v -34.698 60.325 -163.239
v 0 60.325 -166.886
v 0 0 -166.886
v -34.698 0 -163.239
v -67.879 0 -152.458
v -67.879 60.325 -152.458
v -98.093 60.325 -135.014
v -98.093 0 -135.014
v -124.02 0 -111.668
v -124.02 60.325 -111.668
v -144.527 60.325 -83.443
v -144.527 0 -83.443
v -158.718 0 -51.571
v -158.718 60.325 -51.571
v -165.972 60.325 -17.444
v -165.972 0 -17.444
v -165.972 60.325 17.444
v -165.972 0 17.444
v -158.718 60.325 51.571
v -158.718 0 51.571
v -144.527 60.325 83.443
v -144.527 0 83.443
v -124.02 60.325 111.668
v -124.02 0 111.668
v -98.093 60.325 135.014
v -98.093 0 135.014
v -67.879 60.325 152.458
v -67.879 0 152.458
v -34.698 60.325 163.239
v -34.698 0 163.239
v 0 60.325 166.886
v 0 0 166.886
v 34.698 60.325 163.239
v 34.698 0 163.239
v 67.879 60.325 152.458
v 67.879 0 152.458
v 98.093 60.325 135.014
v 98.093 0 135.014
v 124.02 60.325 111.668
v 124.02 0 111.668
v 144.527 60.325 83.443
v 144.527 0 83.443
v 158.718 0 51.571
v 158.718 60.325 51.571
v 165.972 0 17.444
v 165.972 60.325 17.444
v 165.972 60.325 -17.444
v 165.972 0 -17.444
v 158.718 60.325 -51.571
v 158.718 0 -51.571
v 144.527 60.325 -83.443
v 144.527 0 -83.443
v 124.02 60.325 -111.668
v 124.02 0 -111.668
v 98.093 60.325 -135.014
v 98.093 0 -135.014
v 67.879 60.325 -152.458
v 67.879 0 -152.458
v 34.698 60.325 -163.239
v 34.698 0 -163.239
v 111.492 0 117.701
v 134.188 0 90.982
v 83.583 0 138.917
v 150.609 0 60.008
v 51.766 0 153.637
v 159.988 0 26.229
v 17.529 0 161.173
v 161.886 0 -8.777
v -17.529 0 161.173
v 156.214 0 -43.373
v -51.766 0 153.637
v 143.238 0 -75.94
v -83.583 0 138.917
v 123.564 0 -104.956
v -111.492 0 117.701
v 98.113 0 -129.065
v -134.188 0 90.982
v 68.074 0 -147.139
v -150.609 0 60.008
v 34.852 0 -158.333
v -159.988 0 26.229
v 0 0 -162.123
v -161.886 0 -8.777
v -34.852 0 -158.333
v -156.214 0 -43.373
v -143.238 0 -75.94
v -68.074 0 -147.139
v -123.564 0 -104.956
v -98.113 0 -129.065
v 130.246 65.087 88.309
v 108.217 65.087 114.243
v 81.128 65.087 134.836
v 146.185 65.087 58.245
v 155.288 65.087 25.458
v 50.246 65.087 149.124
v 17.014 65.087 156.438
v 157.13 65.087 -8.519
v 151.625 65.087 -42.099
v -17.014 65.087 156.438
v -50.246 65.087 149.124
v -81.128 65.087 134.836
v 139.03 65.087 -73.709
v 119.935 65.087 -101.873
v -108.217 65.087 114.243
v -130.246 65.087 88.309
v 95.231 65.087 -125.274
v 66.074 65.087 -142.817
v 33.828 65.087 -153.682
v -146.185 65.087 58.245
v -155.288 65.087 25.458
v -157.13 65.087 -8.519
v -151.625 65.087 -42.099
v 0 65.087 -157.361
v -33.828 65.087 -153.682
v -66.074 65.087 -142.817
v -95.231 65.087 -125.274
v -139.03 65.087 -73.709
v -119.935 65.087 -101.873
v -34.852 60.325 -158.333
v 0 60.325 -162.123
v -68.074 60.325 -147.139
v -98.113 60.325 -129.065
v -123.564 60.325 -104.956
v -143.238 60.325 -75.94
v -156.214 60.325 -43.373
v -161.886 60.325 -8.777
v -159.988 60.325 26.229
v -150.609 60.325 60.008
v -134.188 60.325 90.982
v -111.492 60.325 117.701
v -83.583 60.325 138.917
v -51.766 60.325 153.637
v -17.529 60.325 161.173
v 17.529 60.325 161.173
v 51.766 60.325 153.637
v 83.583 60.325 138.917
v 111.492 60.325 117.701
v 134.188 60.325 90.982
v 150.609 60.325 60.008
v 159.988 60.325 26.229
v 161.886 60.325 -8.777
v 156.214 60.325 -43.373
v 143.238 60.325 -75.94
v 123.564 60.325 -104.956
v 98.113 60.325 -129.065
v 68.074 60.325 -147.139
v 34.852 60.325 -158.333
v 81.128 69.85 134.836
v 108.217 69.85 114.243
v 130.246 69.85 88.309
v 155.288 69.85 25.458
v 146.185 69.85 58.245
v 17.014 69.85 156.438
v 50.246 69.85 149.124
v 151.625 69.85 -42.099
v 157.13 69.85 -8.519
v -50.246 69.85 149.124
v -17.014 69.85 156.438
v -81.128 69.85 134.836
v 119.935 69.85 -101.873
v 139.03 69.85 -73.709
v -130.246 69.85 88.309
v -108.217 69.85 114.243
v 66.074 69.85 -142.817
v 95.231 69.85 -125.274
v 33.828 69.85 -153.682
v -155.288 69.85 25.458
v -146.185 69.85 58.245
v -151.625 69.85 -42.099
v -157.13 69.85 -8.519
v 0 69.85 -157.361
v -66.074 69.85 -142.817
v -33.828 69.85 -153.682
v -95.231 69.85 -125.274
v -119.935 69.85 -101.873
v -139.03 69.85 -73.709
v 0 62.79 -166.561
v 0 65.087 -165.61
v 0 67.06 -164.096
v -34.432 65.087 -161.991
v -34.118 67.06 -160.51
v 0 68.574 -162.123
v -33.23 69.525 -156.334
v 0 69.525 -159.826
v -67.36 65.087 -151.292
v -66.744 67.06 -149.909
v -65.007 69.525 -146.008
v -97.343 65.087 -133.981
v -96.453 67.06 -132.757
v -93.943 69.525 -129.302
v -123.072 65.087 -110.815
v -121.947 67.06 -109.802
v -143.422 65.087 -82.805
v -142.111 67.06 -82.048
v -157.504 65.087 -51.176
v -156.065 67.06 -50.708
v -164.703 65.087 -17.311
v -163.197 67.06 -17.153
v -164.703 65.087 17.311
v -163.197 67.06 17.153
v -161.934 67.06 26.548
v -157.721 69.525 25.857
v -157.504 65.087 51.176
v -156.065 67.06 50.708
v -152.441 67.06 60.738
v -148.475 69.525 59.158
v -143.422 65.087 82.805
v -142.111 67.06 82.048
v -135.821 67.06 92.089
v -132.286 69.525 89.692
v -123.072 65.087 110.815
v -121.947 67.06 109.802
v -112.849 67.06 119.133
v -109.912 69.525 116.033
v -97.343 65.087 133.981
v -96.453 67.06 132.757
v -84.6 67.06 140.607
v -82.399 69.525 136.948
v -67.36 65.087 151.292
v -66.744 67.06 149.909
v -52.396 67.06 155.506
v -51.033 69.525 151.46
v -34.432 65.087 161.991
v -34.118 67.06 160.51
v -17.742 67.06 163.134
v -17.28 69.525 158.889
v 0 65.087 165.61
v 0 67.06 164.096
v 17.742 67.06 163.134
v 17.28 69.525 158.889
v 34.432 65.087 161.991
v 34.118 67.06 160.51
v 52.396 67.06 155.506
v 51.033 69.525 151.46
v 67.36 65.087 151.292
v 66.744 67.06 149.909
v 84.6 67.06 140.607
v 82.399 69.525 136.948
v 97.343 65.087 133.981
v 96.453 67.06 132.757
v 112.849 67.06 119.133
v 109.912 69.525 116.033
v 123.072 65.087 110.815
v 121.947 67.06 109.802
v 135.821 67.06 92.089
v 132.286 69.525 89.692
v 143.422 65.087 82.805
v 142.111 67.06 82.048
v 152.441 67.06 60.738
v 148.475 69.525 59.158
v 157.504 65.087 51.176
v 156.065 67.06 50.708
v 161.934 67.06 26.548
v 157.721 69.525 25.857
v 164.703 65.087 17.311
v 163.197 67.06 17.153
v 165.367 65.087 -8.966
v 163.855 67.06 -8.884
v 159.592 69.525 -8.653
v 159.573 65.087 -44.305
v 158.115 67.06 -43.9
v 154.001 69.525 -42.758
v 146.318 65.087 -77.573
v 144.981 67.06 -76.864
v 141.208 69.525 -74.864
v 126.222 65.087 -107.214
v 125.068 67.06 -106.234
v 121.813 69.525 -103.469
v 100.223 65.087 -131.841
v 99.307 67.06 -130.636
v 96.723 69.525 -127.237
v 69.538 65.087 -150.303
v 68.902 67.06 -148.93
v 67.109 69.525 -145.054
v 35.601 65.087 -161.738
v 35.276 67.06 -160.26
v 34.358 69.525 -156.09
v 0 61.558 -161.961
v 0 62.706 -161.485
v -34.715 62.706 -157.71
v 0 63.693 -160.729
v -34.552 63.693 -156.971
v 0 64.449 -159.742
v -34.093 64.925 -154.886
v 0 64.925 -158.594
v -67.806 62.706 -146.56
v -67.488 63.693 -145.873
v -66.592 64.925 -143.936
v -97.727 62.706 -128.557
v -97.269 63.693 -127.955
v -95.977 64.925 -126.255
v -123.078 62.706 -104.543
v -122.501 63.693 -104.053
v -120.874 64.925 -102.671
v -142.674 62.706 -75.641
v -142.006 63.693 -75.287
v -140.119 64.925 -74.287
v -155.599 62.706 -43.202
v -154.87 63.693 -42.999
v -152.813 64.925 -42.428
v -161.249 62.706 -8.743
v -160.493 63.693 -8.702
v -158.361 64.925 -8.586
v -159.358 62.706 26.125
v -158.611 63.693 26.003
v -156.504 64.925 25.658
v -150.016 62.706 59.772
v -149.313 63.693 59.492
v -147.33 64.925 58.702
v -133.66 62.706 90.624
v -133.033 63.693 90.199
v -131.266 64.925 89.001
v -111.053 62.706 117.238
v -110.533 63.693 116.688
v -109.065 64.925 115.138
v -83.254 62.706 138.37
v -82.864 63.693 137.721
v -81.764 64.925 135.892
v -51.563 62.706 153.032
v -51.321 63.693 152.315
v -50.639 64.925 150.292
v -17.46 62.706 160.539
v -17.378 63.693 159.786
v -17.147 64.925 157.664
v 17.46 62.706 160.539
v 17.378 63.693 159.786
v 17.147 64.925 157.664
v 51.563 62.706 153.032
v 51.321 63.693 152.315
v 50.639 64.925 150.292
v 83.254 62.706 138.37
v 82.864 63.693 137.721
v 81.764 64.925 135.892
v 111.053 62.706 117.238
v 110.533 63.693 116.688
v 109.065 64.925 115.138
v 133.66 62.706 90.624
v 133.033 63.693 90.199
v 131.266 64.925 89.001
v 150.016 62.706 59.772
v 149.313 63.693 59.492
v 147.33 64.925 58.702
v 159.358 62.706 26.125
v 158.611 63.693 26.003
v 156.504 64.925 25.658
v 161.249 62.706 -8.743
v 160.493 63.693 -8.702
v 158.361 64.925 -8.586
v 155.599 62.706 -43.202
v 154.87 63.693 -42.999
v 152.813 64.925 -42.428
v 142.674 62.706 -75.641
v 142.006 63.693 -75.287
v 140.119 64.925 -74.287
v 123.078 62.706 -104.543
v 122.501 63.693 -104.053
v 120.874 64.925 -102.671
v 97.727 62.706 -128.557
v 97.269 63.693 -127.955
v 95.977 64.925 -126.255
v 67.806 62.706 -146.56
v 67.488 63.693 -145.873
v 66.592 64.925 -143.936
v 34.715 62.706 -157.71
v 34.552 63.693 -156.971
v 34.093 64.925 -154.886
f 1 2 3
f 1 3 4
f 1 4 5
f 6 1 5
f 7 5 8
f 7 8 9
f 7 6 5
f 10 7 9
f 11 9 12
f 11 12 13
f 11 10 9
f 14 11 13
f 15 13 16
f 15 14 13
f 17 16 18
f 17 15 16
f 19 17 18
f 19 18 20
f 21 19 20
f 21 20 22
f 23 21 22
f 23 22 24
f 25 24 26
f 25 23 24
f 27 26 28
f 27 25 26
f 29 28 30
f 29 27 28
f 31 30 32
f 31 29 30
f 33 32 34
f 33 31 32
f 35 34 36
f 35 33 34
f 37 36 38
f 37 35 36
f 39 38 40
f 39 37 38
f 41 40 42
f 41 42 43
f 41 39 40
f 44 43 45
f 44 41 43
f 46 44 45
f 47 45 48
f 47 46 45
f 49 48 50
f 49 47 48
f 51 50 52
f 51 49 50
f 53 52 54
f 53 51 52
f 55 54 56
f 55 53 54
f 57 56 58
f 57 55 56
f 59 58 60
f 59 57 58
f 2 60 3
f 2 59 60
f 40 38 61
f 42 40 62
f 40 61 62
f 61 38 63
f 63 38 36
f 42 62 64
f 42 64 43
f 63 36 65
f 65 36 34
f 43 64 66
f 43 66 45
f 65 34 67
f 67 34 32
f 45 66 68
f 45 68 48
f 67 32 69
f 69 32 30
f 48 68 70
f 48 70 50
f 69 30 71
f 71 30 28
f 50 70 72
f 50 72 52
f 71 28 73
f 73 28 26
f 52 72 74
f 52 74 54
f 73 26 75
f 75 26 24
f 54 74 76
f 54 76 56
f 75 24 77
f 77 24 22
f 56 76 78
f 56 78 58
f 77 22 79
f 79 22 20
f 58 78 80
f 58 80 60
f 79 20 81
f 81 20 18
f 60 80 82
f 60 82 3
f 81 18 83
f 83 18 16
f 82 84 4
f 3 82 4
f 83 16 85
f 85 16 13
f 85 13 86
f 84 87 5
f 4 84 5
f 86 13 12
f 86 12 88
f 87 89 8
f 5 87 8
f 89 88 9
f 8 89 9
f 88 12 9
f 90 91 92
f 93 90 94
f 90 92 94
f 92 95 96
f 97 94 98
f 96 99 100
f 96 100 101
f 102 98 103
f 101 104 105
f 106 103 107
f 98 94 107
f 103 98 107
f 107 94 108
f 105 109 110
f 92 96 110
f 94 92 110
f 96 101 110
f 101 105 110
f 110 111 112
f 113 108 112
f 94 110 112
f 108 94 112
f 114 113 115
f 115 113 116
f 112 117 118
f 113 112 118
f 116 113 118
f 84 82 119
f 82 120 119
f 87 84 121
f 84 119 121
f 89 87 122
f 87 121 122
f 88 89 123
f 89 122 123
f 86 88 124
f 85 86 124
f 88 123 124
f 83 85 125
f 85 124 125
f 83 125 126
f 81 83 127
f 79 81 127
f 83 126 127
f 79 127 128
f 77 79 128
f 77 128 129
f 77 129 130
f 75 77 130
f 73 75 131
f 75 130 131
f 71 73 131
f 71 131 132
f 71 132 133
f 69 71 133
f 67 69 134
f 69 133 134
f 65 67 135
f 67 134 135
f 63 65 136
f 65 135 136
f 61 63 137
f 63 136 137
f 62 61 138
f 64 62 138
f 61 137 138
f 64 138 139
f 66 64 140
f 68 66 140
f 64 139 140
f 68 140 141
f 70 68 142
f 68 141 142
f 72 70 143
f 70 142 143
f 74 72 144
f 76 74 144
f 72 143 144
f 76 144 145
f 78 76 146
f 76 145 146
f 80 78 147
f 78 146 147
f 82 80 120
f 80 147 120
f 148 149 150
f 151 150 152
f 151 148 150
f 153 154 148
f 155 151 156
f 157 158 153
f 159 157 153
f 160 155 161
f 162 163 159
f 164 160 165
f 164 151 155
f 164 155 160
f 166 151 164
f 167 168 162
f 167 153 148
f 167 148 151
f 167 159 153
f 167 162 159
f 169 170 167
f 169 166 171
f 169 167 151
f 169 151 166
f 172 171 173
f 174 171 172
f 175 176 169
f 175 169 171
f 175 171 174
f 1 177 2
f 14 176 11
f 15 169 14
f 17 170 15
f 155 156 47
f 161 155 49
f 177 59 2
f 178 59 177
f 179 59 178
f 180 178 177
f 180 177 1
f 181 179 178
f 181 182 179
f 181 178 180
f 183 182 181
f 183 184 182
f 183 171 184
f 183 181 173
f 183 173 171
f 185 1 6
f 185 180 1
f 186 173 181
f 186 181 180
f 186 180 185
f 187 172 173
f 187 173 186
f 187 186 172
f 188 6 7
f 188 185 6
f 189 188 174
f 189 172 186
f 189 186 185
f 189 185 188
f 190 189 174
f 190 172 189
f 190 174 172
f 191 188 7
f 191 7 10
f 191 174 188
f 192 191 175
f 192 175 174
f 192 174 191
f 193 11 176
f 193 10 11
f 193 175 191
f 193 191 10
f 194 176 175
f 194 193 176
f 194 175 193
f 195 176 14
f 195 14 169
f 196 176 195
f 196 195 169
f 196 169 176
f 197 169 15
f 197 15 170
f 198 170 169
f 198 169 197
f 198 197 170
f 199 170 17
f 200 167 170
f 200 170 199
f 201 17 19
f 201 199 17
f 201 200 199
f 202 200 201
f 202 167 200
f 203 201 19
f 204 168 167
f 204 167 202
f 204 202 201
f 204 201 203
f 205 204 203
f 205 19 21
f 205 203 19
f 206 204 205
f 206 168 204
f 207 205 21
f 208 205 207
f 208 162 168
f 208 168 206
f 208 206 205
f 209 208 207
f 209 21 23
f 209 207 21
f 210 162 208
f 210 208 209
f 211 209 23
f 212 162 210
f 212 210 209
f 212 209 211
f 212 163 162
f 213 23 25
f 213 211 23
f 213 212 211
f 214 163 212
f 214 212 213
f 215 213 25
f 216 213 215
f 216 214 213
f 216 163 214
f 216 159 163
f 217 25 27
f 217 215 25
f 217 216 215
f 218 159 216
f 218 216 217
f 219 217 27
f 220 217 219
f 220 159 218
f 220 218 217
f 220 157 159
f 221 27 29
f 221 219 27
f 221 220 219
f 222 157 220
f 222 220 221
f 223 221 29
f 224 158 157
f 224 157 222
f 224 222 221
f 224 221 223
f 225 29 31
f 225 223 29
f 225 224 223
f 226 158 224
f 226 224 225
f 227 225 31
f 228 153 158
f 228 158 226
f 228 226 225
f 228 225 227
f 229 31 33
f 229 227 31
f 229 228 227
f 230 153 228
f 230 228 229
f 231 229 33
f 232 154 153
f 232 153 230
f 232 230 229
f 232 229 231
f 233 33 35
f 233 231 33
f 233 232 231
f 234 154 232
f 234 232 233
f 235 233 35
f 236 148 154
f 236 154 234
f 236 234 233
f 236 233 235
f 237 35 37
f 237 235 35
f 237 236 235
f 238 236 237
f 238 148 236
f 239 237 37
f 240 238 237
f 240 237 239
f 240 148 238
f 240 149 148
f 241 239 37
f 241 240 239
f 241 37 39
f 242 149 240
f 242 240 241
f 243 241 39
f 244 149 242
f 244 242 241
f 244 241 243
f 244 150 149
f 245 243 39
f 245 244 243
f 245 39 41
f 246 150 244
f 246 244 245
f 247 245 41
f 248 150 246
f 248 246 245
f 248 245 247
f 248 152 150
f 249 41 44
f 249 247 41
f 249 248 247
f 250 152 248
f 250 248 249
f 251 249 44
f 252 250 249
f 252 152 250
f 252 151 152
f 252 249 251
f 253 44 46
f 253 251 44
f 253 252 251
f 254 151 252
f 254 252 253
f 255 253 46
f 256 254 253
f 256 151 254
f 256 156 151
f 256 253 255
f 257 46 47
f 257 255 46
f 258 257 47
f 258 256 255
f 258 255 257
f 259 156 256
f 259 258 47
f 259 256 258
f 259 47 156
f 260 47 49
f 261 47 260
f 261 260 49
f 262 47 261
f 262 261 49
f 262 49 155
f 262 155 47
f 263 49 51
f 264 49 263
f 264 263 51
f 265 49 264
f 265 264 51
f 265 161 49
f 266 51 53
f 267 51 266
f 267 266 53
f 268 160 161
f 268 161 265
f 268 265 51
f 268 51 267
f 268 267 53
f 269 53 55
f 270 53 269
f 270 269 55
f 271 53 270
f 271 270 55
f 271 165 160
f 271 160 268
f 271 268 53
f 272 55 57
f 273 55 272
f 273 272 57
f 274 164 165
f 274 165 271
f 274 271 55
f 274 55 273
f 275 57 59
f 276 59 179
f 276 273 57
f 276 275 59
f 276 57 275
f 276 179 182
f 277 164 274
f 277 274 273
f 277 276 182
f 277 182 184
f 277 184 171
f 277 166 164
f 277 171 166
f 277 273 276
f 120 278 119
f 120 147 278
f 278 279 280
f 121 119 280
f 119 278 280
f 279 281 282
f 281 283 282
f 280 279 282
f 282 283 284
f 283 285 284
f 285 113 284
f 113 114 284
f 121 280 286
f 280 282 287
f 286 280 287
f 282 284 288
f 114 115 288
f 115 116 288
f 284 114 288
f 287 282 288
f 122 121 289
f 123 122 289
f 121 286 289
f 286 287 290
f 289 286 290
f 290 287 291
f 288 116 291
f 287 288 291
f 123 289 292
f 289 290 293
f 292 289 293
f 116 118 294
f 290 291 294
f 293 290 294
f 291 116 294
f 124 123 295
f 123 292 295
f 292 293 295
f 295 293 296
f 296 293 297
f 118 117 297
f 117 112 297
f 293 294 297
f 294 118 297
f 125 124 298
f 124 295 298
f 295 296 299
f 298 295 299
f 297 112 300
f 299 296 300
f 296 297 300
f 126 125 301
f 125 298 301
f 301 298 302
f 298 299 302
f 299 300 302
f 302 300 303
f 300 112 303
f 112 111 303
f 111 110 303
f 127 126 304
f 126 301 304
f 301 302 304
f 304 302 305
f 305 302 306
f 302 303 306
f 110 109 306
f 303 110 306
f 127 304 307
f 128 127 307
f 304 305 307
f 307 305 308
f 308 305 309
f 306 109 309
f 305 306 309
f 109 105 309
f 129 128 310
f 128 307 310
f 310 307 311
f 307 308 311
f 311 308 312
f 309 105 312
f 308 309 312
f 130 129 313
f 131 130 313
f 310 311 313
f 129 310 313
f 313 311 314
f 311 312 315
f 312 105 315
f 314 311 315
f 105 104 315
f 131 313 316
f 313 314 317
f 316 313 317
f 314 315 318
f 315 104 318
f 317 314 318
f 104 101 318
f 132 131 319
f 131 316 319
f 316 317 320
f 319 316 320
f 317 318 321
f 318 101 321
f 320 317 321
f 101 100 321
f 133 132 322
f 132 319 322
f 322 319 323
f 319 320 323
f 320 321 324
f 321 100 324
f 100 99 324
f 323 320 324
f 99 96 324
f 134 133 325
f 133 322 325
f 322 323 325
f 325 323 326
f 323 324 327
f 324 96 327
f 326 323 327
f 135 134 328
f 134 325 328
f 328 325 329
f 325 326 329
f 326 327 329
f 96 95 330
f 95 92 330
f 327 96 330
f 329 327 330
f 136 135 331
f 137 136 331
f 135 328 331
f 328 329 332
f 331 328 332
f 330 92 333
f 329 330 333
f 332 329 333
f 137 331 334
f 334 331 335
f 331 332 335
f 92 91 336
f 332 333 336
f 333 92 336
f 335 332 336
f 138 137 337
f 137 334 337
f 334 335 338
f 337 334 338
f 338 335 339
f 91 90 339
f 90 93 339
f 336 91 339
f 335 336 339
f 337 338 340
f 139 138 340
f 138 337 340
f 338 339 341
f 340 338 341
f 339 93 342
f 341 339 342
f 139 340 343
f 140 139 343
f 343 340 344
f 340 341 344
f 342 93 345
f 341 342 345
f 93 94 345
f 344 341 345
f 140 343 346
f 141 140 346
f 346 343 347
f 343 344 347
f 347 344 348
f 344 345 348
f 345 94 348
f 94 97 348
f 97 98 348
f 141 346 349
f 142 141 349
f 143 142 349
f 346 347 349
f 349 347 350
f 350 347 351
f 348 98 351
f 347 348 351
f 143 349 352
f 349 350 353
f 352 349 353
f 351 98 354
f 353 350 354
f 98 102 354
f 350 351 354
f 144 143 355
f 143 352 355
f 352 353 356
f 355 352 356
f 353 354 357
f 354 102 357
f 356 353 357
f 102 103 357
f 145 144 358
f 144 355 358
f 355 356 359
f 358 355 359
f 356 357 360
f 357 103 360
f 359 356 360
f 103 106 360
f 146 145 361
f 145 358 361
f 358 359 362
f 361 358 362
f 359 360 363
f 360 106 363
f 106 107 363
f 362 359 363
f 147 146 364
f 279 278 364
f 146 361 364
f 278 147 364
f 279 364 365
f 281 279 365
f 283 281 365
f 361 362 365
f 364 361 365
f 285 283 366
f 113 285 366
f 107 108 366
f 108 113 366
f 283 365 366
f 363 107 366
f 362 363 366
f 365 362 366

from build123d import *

# Parameters (mm, degrees)
SKETCH1_W = 166.8859375
SKETCH1_H = 69.85
FILLET1_R = 9.525
SHELL1_T  = -4.7625


with BuildPart() as part:
    # Sketch1 → Revolve1 (revolve)
    with BuildSketch(Plane(origin=(0, 0, 0), x_dir=(0, 0, -1), z_dir=(1, 0, 0)), mode=Mode.PRIVATE) as revolve1_sk:
        with Locations((-83.44296875, 34.925)):
            Rectangle(SKETCH1_W, SKETCH1_H)
    revolve(revolve1_sk.sketch.rotate(Axis((0, 0, 0), (0, 1, 0)), 180), axis=Axis((0, 0, 0), (0, 1, 0)))

    # Fillet1
    fillet1_edges = [part.edges().sort_by_distance(p)[0] for p in [
        (0, 69.85, 166.8859375),
    ]]
    fillet(fillet1_edges, radius=FILLET1_R)

    # Shell1
    shell1_openings = [part.faces().sort_by_distance(p)[0] for p in [
        (0, 0, 0),
    ]]
    offset(amount=SHELL1_T, openings=shell1_openings, kind=Kind.INTERSECTION)


solid = part.part
